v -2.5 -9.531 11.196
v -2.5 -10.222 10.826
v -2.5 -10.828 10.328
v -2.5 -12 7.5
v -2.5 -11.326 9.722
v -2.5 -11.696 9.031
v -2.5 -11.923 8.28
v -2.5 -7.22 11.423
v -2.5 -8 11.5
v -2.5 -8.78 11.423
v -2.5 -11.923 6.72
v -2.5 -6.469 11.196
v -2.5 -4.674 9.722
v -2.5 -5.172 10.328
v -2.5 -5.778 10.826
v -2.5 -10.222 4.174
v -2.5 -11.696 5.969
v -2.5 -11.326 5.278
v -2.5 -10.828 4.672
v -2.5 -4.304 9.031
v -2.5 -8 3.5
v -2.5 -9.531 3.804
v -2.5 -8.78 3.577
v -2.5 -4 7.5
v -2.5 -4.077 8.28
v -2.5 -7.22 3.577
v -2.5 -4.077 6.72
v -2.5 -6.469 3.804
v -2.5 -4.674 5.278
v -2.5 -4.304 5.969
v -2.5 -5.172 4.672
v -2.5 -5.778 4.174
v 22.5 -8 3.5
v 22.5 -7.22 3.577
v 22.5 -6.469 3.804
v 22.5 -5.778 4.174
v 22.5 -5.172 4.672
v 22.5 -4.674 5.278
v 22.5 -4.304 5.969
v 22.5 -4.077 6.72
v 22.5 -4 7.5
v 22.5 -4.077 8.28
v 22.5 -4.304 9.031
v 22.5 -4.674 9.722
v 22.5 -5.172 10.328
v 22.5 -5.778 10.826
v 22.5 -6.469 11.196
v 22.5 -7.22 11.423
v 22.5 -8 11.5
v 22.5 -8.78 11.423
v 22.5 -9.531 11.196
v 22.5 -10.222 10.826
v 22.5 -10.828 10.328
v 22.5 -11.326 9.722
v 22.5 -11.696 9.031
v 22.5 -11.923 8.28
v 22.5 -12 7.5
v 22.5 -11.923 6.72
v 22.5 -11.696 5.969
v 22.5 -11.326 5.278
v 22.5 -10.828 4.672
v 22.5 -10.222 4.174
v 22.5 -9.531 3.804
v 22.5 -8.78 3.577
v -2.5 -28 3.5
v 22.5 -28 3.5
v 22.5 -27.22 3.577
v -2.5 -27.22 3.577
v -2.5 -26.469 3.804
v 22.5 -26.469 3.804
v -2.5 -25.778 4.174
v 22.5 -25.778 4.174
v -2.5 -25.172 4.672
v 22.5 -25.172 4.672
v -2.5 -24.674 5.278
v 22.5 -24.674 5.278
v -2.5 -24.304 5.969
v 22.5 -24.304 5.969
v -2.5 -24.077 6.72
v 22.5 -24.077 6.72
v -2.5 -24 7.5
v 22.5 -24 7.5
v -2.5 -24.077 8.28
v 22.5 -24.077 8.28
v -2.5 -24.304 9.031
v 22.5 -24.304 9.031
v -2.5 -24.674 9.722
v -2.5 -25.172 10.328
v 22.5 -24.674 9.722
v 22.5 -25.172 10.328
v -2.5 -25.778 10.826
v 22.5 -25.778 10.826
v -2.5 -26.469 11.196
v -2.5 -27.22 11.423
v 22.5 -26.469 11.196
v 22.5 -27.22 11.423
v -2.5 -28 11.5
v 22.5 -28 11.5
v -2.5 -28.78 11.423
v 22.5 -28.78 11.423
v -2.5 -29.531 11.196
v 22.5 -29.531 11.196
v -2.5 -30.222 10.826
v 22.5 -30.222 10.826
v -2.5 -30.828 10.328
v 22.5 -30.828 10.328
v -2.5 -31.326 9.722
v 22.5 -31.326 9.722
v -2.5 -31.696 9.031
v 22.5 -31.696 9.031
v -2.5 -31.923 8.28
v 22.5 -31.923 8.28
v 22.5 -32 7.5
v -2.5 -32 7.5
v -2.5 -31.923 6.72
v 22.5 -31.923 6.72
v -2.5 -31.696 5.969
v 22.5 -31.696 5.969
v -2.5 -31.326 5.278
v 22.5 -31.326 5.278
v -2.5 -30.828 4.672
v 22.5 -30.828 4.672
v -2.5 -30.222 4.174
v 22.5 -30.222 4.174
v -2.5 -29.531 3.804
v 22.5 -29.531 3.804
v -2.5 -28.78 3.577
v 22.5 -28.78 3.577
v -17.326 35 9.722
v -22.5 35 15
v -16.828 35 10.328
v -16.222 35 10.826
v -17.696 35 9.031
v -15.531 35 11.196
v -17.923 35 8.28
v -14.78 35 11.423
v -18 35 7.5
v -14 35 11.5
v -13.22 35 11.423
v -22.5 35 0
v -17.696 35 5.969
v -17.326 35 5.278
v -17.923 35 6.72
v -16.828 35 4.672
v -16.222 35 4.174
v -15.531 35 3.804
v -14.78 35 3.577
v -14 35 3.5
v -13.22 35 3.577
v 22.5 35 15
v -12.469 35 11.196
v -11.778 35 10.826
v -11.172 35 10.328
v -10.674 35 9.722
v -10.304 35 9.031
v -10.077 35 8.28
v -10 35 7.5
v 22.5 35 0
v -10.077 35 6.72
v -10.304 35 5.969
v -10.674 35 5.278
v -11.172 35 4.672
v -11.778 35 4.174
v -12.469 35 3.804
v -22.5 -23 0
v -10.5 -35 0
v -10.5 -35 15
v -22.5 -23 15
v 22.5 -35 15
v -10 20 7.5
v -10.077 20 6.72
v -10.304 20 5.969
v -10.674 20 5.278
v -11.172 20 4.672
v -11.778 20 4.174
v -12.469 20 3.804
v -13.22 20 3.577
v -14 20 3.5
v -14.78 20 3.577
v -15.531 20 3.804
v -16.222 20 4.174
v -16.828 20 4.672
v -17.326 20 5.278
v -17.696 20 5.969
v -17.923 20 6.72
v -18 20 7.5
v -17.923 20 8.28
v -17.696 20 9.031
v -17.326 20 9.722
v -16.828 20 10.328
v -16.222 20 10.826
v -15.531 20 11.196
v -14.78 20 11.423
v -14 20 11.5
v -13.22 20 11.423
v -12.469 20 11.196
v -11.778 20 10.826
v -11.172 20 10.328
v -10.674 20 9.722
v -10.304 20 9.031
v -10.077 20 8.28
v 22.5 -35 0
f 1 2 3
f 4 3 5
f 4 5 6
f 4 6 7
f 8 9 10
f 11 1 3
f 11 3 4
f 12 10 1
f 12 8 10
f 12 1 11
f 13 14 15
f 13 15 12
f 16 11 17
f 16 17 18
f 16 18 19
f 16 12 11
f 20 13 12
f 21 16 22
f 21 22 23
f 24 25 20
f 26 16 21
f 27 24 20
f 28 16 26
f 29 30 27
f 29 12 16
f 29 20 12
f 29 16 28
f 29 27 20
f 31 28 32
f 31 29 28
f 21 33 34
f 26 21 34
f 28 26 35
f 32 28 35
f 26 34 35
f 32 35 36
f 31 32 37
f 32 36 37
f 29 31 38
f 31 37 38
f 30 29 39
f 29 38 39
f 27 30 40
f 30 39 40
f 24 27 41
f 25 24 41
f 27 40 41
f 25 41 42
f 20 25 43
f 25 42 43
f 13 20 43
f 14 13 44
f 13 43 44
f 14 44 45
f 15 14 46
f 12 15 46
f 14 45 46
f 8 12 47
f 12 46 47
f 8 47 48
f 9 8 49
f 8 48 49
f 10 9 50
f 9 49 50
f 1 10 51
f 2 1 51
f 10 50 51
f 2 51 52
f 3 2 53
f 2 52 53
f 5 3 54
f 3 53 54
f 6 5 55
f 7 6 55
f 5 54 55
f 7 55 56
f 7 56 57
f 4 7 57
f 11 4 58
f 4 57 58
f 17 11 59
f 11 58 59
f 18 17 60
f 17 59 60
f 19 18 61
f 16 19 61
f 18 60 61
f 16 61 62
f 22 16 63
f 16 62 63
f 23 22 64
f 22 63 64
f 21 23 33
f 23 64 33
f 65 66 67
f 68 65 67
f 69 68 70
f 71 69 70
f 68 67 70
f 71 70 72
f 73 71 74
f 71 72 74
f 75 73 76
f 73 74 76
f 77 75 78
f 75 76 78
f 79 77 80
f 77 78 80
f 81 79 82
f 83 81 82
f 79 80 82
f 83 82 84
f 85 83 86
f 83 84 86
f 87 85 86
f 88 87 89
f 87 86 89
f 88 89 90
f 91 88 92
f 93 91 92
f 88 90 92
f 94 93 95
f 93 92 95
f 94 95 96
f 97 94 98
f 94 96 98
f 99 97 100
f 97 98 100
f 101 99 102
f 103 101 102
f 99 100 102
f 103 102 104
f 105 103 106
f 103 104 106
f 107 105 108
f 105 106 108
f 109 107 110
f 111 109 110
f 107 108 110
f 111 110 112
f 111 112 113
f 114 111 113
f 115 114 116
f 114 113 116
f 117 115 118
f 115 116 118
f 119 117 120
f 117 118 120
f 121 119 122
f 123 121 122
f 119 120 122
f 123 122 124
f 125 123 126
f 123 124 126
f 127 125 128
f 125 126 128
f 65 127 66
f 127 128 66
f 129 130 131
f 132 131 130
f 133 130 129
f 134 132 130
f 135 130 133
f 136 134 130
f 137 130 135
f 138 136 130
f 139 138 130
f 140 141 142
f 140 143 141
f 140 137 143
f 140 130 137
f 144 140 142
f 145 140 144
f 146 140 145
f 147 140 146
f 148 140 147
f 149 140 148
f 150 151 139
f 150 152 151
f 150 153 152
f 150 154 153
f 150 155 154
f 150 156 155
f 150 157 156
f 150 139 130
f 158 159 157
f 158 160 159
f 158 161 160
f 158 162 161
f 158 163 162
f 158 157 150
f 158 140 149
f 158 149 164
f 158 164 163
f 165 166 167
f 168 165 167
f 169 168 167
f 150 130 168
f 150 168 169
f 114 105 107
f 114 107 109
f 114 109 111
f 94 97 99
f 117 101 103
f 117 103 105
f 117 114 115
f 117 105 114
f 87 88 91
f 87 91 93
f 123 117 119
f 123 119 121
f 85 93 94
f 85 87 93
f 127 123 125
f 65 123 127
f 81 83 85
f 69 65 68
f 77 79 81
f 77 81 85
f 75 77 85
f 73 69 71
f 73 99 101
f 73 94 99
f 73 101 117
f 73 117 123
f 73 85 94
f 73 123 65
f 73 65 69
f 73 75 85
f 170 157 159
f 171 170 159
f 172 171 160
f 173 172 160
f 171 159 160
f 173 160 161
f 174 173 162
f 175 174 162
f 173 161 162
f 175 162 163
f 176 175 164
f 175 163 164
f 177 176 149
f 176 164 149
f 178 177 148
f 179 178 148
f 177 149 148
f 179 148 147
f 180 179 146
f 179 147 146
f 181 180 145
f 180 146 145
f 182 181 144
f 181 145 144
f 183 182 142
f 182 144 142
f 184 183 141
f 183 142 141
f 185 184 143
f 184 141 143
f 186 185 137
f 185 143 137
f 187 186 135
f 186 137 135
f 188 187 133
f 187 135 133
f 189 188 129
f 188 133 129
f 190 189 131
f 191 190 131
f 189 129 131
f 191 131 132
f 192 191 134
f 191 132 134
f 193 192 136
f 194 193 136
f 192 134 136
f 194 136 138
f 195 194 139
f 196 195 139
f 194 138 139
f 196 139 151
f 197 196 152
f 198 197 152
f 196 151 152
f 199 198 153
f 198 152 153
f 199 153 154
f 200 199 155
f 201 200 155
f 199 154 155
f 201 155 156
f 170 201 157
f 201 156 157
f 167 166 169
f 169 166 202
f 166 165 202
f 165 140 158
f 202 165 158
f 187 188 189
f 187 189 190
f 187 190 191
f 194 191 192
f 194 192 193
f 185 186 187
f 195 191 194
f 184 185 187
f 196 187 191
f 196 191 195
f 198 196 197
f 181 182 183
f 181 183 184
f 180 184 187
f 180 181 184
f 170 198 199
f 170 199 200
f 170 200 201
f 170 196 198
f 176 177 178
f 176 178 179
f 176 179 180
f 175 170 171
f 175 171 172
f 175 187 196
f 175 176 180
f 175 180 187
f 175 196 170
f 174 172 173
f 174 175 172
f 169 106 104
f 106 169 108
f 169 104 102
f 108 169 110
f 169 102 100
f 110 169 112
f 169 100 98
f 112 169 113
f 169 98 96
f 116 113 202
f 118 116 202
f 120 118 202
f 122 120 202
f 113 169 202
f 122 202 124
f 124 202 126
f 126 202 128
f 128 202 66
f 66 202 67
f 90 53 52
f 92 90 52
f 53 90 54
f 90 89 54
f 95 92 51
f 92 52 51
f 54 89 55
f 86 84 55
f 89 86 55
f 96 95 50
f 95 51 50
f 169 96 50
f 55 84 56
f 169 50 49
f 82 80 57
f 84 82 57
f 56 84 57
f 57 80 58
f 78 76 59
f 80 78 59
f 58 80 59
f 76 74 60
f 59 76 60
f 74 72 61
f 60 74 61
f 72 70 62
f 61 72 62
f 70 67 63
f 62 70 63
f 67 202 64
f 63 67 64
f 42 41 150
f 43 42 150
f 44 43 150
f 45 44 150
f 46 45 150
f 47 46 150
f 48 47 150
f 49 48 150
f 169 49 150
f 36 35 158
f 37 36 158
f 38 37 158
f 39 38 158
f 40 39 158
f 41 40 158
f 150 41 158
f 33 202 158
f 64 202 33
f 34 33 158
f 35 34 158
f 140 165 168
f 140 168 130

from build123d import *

# Parameters (mm, degrees)
SZKIC1_W                    = 45
SZKIC1_H                    = 70
DODANIE_WYCI_GNI_CIE1_DEPTH = 15
SZKIC3_R                    = 4
WYTNIJ_WYCI_GNI_CIE1_DEPTH  = 15
SFAZOWANIE1_SIZE            = 12
SZKIC4_R                    = 4
WYTNIJ_WYCI_GNI_CIE2_DEPTH  = 25


with BuildPart() as part:
    # Szkic1 → Dodanie-wyciągnięcie1 (new body)
    with BuildSketch(Plane.XY):
        Rectangle(SZKIC1_W, SZKIC1_H)
    extrude(amount=DODANIE_WYCI_GNI_CIE1_DEPTH)

    # Szkic3 → Wytnij-wyciągnięcie1 (cut)
    with BuildSketch(Plane(origin=(0, 35, 0), x_dir=(1, 0, 0), z_dir=(0, 1, 0))):
        with Locations((-14, -7.5)):
            Circle(SZKIC3_R)
    extrude(amount=-WYTNIJ_WYCI_GNI_CIE1_DEPTH, mode=Mode.SUBTRACT)

    # Sfazowanie1
    sfazowanie1_edges = [part.edges().sort_by_distance(p)[0] for p in [
        (-22.5, -35, 7.5),
    ]]
    chamfer(sfazowanie1_edges, length=SFAZOWANIE1_SIZE)

    # Szkic4 → Wytnij-wyciągnięcie2 (cut)
    with BuildSketch(Plane(origin=(22.5, 0, 0), x_dir=(0, 0, -1), z_dir=(1, 0, 0))):
        with Locations((-7.5, -28)):
            Circle(SZKIC4_R)
        with Locations((-7.5, -8)):
            Circle(SZKIC4_R)
    extrude(amount=-WYTNIJ_WYCI_GNI_CIE2_DEPTH, mode=Mode.SUBTRACT)


solid = part.part
